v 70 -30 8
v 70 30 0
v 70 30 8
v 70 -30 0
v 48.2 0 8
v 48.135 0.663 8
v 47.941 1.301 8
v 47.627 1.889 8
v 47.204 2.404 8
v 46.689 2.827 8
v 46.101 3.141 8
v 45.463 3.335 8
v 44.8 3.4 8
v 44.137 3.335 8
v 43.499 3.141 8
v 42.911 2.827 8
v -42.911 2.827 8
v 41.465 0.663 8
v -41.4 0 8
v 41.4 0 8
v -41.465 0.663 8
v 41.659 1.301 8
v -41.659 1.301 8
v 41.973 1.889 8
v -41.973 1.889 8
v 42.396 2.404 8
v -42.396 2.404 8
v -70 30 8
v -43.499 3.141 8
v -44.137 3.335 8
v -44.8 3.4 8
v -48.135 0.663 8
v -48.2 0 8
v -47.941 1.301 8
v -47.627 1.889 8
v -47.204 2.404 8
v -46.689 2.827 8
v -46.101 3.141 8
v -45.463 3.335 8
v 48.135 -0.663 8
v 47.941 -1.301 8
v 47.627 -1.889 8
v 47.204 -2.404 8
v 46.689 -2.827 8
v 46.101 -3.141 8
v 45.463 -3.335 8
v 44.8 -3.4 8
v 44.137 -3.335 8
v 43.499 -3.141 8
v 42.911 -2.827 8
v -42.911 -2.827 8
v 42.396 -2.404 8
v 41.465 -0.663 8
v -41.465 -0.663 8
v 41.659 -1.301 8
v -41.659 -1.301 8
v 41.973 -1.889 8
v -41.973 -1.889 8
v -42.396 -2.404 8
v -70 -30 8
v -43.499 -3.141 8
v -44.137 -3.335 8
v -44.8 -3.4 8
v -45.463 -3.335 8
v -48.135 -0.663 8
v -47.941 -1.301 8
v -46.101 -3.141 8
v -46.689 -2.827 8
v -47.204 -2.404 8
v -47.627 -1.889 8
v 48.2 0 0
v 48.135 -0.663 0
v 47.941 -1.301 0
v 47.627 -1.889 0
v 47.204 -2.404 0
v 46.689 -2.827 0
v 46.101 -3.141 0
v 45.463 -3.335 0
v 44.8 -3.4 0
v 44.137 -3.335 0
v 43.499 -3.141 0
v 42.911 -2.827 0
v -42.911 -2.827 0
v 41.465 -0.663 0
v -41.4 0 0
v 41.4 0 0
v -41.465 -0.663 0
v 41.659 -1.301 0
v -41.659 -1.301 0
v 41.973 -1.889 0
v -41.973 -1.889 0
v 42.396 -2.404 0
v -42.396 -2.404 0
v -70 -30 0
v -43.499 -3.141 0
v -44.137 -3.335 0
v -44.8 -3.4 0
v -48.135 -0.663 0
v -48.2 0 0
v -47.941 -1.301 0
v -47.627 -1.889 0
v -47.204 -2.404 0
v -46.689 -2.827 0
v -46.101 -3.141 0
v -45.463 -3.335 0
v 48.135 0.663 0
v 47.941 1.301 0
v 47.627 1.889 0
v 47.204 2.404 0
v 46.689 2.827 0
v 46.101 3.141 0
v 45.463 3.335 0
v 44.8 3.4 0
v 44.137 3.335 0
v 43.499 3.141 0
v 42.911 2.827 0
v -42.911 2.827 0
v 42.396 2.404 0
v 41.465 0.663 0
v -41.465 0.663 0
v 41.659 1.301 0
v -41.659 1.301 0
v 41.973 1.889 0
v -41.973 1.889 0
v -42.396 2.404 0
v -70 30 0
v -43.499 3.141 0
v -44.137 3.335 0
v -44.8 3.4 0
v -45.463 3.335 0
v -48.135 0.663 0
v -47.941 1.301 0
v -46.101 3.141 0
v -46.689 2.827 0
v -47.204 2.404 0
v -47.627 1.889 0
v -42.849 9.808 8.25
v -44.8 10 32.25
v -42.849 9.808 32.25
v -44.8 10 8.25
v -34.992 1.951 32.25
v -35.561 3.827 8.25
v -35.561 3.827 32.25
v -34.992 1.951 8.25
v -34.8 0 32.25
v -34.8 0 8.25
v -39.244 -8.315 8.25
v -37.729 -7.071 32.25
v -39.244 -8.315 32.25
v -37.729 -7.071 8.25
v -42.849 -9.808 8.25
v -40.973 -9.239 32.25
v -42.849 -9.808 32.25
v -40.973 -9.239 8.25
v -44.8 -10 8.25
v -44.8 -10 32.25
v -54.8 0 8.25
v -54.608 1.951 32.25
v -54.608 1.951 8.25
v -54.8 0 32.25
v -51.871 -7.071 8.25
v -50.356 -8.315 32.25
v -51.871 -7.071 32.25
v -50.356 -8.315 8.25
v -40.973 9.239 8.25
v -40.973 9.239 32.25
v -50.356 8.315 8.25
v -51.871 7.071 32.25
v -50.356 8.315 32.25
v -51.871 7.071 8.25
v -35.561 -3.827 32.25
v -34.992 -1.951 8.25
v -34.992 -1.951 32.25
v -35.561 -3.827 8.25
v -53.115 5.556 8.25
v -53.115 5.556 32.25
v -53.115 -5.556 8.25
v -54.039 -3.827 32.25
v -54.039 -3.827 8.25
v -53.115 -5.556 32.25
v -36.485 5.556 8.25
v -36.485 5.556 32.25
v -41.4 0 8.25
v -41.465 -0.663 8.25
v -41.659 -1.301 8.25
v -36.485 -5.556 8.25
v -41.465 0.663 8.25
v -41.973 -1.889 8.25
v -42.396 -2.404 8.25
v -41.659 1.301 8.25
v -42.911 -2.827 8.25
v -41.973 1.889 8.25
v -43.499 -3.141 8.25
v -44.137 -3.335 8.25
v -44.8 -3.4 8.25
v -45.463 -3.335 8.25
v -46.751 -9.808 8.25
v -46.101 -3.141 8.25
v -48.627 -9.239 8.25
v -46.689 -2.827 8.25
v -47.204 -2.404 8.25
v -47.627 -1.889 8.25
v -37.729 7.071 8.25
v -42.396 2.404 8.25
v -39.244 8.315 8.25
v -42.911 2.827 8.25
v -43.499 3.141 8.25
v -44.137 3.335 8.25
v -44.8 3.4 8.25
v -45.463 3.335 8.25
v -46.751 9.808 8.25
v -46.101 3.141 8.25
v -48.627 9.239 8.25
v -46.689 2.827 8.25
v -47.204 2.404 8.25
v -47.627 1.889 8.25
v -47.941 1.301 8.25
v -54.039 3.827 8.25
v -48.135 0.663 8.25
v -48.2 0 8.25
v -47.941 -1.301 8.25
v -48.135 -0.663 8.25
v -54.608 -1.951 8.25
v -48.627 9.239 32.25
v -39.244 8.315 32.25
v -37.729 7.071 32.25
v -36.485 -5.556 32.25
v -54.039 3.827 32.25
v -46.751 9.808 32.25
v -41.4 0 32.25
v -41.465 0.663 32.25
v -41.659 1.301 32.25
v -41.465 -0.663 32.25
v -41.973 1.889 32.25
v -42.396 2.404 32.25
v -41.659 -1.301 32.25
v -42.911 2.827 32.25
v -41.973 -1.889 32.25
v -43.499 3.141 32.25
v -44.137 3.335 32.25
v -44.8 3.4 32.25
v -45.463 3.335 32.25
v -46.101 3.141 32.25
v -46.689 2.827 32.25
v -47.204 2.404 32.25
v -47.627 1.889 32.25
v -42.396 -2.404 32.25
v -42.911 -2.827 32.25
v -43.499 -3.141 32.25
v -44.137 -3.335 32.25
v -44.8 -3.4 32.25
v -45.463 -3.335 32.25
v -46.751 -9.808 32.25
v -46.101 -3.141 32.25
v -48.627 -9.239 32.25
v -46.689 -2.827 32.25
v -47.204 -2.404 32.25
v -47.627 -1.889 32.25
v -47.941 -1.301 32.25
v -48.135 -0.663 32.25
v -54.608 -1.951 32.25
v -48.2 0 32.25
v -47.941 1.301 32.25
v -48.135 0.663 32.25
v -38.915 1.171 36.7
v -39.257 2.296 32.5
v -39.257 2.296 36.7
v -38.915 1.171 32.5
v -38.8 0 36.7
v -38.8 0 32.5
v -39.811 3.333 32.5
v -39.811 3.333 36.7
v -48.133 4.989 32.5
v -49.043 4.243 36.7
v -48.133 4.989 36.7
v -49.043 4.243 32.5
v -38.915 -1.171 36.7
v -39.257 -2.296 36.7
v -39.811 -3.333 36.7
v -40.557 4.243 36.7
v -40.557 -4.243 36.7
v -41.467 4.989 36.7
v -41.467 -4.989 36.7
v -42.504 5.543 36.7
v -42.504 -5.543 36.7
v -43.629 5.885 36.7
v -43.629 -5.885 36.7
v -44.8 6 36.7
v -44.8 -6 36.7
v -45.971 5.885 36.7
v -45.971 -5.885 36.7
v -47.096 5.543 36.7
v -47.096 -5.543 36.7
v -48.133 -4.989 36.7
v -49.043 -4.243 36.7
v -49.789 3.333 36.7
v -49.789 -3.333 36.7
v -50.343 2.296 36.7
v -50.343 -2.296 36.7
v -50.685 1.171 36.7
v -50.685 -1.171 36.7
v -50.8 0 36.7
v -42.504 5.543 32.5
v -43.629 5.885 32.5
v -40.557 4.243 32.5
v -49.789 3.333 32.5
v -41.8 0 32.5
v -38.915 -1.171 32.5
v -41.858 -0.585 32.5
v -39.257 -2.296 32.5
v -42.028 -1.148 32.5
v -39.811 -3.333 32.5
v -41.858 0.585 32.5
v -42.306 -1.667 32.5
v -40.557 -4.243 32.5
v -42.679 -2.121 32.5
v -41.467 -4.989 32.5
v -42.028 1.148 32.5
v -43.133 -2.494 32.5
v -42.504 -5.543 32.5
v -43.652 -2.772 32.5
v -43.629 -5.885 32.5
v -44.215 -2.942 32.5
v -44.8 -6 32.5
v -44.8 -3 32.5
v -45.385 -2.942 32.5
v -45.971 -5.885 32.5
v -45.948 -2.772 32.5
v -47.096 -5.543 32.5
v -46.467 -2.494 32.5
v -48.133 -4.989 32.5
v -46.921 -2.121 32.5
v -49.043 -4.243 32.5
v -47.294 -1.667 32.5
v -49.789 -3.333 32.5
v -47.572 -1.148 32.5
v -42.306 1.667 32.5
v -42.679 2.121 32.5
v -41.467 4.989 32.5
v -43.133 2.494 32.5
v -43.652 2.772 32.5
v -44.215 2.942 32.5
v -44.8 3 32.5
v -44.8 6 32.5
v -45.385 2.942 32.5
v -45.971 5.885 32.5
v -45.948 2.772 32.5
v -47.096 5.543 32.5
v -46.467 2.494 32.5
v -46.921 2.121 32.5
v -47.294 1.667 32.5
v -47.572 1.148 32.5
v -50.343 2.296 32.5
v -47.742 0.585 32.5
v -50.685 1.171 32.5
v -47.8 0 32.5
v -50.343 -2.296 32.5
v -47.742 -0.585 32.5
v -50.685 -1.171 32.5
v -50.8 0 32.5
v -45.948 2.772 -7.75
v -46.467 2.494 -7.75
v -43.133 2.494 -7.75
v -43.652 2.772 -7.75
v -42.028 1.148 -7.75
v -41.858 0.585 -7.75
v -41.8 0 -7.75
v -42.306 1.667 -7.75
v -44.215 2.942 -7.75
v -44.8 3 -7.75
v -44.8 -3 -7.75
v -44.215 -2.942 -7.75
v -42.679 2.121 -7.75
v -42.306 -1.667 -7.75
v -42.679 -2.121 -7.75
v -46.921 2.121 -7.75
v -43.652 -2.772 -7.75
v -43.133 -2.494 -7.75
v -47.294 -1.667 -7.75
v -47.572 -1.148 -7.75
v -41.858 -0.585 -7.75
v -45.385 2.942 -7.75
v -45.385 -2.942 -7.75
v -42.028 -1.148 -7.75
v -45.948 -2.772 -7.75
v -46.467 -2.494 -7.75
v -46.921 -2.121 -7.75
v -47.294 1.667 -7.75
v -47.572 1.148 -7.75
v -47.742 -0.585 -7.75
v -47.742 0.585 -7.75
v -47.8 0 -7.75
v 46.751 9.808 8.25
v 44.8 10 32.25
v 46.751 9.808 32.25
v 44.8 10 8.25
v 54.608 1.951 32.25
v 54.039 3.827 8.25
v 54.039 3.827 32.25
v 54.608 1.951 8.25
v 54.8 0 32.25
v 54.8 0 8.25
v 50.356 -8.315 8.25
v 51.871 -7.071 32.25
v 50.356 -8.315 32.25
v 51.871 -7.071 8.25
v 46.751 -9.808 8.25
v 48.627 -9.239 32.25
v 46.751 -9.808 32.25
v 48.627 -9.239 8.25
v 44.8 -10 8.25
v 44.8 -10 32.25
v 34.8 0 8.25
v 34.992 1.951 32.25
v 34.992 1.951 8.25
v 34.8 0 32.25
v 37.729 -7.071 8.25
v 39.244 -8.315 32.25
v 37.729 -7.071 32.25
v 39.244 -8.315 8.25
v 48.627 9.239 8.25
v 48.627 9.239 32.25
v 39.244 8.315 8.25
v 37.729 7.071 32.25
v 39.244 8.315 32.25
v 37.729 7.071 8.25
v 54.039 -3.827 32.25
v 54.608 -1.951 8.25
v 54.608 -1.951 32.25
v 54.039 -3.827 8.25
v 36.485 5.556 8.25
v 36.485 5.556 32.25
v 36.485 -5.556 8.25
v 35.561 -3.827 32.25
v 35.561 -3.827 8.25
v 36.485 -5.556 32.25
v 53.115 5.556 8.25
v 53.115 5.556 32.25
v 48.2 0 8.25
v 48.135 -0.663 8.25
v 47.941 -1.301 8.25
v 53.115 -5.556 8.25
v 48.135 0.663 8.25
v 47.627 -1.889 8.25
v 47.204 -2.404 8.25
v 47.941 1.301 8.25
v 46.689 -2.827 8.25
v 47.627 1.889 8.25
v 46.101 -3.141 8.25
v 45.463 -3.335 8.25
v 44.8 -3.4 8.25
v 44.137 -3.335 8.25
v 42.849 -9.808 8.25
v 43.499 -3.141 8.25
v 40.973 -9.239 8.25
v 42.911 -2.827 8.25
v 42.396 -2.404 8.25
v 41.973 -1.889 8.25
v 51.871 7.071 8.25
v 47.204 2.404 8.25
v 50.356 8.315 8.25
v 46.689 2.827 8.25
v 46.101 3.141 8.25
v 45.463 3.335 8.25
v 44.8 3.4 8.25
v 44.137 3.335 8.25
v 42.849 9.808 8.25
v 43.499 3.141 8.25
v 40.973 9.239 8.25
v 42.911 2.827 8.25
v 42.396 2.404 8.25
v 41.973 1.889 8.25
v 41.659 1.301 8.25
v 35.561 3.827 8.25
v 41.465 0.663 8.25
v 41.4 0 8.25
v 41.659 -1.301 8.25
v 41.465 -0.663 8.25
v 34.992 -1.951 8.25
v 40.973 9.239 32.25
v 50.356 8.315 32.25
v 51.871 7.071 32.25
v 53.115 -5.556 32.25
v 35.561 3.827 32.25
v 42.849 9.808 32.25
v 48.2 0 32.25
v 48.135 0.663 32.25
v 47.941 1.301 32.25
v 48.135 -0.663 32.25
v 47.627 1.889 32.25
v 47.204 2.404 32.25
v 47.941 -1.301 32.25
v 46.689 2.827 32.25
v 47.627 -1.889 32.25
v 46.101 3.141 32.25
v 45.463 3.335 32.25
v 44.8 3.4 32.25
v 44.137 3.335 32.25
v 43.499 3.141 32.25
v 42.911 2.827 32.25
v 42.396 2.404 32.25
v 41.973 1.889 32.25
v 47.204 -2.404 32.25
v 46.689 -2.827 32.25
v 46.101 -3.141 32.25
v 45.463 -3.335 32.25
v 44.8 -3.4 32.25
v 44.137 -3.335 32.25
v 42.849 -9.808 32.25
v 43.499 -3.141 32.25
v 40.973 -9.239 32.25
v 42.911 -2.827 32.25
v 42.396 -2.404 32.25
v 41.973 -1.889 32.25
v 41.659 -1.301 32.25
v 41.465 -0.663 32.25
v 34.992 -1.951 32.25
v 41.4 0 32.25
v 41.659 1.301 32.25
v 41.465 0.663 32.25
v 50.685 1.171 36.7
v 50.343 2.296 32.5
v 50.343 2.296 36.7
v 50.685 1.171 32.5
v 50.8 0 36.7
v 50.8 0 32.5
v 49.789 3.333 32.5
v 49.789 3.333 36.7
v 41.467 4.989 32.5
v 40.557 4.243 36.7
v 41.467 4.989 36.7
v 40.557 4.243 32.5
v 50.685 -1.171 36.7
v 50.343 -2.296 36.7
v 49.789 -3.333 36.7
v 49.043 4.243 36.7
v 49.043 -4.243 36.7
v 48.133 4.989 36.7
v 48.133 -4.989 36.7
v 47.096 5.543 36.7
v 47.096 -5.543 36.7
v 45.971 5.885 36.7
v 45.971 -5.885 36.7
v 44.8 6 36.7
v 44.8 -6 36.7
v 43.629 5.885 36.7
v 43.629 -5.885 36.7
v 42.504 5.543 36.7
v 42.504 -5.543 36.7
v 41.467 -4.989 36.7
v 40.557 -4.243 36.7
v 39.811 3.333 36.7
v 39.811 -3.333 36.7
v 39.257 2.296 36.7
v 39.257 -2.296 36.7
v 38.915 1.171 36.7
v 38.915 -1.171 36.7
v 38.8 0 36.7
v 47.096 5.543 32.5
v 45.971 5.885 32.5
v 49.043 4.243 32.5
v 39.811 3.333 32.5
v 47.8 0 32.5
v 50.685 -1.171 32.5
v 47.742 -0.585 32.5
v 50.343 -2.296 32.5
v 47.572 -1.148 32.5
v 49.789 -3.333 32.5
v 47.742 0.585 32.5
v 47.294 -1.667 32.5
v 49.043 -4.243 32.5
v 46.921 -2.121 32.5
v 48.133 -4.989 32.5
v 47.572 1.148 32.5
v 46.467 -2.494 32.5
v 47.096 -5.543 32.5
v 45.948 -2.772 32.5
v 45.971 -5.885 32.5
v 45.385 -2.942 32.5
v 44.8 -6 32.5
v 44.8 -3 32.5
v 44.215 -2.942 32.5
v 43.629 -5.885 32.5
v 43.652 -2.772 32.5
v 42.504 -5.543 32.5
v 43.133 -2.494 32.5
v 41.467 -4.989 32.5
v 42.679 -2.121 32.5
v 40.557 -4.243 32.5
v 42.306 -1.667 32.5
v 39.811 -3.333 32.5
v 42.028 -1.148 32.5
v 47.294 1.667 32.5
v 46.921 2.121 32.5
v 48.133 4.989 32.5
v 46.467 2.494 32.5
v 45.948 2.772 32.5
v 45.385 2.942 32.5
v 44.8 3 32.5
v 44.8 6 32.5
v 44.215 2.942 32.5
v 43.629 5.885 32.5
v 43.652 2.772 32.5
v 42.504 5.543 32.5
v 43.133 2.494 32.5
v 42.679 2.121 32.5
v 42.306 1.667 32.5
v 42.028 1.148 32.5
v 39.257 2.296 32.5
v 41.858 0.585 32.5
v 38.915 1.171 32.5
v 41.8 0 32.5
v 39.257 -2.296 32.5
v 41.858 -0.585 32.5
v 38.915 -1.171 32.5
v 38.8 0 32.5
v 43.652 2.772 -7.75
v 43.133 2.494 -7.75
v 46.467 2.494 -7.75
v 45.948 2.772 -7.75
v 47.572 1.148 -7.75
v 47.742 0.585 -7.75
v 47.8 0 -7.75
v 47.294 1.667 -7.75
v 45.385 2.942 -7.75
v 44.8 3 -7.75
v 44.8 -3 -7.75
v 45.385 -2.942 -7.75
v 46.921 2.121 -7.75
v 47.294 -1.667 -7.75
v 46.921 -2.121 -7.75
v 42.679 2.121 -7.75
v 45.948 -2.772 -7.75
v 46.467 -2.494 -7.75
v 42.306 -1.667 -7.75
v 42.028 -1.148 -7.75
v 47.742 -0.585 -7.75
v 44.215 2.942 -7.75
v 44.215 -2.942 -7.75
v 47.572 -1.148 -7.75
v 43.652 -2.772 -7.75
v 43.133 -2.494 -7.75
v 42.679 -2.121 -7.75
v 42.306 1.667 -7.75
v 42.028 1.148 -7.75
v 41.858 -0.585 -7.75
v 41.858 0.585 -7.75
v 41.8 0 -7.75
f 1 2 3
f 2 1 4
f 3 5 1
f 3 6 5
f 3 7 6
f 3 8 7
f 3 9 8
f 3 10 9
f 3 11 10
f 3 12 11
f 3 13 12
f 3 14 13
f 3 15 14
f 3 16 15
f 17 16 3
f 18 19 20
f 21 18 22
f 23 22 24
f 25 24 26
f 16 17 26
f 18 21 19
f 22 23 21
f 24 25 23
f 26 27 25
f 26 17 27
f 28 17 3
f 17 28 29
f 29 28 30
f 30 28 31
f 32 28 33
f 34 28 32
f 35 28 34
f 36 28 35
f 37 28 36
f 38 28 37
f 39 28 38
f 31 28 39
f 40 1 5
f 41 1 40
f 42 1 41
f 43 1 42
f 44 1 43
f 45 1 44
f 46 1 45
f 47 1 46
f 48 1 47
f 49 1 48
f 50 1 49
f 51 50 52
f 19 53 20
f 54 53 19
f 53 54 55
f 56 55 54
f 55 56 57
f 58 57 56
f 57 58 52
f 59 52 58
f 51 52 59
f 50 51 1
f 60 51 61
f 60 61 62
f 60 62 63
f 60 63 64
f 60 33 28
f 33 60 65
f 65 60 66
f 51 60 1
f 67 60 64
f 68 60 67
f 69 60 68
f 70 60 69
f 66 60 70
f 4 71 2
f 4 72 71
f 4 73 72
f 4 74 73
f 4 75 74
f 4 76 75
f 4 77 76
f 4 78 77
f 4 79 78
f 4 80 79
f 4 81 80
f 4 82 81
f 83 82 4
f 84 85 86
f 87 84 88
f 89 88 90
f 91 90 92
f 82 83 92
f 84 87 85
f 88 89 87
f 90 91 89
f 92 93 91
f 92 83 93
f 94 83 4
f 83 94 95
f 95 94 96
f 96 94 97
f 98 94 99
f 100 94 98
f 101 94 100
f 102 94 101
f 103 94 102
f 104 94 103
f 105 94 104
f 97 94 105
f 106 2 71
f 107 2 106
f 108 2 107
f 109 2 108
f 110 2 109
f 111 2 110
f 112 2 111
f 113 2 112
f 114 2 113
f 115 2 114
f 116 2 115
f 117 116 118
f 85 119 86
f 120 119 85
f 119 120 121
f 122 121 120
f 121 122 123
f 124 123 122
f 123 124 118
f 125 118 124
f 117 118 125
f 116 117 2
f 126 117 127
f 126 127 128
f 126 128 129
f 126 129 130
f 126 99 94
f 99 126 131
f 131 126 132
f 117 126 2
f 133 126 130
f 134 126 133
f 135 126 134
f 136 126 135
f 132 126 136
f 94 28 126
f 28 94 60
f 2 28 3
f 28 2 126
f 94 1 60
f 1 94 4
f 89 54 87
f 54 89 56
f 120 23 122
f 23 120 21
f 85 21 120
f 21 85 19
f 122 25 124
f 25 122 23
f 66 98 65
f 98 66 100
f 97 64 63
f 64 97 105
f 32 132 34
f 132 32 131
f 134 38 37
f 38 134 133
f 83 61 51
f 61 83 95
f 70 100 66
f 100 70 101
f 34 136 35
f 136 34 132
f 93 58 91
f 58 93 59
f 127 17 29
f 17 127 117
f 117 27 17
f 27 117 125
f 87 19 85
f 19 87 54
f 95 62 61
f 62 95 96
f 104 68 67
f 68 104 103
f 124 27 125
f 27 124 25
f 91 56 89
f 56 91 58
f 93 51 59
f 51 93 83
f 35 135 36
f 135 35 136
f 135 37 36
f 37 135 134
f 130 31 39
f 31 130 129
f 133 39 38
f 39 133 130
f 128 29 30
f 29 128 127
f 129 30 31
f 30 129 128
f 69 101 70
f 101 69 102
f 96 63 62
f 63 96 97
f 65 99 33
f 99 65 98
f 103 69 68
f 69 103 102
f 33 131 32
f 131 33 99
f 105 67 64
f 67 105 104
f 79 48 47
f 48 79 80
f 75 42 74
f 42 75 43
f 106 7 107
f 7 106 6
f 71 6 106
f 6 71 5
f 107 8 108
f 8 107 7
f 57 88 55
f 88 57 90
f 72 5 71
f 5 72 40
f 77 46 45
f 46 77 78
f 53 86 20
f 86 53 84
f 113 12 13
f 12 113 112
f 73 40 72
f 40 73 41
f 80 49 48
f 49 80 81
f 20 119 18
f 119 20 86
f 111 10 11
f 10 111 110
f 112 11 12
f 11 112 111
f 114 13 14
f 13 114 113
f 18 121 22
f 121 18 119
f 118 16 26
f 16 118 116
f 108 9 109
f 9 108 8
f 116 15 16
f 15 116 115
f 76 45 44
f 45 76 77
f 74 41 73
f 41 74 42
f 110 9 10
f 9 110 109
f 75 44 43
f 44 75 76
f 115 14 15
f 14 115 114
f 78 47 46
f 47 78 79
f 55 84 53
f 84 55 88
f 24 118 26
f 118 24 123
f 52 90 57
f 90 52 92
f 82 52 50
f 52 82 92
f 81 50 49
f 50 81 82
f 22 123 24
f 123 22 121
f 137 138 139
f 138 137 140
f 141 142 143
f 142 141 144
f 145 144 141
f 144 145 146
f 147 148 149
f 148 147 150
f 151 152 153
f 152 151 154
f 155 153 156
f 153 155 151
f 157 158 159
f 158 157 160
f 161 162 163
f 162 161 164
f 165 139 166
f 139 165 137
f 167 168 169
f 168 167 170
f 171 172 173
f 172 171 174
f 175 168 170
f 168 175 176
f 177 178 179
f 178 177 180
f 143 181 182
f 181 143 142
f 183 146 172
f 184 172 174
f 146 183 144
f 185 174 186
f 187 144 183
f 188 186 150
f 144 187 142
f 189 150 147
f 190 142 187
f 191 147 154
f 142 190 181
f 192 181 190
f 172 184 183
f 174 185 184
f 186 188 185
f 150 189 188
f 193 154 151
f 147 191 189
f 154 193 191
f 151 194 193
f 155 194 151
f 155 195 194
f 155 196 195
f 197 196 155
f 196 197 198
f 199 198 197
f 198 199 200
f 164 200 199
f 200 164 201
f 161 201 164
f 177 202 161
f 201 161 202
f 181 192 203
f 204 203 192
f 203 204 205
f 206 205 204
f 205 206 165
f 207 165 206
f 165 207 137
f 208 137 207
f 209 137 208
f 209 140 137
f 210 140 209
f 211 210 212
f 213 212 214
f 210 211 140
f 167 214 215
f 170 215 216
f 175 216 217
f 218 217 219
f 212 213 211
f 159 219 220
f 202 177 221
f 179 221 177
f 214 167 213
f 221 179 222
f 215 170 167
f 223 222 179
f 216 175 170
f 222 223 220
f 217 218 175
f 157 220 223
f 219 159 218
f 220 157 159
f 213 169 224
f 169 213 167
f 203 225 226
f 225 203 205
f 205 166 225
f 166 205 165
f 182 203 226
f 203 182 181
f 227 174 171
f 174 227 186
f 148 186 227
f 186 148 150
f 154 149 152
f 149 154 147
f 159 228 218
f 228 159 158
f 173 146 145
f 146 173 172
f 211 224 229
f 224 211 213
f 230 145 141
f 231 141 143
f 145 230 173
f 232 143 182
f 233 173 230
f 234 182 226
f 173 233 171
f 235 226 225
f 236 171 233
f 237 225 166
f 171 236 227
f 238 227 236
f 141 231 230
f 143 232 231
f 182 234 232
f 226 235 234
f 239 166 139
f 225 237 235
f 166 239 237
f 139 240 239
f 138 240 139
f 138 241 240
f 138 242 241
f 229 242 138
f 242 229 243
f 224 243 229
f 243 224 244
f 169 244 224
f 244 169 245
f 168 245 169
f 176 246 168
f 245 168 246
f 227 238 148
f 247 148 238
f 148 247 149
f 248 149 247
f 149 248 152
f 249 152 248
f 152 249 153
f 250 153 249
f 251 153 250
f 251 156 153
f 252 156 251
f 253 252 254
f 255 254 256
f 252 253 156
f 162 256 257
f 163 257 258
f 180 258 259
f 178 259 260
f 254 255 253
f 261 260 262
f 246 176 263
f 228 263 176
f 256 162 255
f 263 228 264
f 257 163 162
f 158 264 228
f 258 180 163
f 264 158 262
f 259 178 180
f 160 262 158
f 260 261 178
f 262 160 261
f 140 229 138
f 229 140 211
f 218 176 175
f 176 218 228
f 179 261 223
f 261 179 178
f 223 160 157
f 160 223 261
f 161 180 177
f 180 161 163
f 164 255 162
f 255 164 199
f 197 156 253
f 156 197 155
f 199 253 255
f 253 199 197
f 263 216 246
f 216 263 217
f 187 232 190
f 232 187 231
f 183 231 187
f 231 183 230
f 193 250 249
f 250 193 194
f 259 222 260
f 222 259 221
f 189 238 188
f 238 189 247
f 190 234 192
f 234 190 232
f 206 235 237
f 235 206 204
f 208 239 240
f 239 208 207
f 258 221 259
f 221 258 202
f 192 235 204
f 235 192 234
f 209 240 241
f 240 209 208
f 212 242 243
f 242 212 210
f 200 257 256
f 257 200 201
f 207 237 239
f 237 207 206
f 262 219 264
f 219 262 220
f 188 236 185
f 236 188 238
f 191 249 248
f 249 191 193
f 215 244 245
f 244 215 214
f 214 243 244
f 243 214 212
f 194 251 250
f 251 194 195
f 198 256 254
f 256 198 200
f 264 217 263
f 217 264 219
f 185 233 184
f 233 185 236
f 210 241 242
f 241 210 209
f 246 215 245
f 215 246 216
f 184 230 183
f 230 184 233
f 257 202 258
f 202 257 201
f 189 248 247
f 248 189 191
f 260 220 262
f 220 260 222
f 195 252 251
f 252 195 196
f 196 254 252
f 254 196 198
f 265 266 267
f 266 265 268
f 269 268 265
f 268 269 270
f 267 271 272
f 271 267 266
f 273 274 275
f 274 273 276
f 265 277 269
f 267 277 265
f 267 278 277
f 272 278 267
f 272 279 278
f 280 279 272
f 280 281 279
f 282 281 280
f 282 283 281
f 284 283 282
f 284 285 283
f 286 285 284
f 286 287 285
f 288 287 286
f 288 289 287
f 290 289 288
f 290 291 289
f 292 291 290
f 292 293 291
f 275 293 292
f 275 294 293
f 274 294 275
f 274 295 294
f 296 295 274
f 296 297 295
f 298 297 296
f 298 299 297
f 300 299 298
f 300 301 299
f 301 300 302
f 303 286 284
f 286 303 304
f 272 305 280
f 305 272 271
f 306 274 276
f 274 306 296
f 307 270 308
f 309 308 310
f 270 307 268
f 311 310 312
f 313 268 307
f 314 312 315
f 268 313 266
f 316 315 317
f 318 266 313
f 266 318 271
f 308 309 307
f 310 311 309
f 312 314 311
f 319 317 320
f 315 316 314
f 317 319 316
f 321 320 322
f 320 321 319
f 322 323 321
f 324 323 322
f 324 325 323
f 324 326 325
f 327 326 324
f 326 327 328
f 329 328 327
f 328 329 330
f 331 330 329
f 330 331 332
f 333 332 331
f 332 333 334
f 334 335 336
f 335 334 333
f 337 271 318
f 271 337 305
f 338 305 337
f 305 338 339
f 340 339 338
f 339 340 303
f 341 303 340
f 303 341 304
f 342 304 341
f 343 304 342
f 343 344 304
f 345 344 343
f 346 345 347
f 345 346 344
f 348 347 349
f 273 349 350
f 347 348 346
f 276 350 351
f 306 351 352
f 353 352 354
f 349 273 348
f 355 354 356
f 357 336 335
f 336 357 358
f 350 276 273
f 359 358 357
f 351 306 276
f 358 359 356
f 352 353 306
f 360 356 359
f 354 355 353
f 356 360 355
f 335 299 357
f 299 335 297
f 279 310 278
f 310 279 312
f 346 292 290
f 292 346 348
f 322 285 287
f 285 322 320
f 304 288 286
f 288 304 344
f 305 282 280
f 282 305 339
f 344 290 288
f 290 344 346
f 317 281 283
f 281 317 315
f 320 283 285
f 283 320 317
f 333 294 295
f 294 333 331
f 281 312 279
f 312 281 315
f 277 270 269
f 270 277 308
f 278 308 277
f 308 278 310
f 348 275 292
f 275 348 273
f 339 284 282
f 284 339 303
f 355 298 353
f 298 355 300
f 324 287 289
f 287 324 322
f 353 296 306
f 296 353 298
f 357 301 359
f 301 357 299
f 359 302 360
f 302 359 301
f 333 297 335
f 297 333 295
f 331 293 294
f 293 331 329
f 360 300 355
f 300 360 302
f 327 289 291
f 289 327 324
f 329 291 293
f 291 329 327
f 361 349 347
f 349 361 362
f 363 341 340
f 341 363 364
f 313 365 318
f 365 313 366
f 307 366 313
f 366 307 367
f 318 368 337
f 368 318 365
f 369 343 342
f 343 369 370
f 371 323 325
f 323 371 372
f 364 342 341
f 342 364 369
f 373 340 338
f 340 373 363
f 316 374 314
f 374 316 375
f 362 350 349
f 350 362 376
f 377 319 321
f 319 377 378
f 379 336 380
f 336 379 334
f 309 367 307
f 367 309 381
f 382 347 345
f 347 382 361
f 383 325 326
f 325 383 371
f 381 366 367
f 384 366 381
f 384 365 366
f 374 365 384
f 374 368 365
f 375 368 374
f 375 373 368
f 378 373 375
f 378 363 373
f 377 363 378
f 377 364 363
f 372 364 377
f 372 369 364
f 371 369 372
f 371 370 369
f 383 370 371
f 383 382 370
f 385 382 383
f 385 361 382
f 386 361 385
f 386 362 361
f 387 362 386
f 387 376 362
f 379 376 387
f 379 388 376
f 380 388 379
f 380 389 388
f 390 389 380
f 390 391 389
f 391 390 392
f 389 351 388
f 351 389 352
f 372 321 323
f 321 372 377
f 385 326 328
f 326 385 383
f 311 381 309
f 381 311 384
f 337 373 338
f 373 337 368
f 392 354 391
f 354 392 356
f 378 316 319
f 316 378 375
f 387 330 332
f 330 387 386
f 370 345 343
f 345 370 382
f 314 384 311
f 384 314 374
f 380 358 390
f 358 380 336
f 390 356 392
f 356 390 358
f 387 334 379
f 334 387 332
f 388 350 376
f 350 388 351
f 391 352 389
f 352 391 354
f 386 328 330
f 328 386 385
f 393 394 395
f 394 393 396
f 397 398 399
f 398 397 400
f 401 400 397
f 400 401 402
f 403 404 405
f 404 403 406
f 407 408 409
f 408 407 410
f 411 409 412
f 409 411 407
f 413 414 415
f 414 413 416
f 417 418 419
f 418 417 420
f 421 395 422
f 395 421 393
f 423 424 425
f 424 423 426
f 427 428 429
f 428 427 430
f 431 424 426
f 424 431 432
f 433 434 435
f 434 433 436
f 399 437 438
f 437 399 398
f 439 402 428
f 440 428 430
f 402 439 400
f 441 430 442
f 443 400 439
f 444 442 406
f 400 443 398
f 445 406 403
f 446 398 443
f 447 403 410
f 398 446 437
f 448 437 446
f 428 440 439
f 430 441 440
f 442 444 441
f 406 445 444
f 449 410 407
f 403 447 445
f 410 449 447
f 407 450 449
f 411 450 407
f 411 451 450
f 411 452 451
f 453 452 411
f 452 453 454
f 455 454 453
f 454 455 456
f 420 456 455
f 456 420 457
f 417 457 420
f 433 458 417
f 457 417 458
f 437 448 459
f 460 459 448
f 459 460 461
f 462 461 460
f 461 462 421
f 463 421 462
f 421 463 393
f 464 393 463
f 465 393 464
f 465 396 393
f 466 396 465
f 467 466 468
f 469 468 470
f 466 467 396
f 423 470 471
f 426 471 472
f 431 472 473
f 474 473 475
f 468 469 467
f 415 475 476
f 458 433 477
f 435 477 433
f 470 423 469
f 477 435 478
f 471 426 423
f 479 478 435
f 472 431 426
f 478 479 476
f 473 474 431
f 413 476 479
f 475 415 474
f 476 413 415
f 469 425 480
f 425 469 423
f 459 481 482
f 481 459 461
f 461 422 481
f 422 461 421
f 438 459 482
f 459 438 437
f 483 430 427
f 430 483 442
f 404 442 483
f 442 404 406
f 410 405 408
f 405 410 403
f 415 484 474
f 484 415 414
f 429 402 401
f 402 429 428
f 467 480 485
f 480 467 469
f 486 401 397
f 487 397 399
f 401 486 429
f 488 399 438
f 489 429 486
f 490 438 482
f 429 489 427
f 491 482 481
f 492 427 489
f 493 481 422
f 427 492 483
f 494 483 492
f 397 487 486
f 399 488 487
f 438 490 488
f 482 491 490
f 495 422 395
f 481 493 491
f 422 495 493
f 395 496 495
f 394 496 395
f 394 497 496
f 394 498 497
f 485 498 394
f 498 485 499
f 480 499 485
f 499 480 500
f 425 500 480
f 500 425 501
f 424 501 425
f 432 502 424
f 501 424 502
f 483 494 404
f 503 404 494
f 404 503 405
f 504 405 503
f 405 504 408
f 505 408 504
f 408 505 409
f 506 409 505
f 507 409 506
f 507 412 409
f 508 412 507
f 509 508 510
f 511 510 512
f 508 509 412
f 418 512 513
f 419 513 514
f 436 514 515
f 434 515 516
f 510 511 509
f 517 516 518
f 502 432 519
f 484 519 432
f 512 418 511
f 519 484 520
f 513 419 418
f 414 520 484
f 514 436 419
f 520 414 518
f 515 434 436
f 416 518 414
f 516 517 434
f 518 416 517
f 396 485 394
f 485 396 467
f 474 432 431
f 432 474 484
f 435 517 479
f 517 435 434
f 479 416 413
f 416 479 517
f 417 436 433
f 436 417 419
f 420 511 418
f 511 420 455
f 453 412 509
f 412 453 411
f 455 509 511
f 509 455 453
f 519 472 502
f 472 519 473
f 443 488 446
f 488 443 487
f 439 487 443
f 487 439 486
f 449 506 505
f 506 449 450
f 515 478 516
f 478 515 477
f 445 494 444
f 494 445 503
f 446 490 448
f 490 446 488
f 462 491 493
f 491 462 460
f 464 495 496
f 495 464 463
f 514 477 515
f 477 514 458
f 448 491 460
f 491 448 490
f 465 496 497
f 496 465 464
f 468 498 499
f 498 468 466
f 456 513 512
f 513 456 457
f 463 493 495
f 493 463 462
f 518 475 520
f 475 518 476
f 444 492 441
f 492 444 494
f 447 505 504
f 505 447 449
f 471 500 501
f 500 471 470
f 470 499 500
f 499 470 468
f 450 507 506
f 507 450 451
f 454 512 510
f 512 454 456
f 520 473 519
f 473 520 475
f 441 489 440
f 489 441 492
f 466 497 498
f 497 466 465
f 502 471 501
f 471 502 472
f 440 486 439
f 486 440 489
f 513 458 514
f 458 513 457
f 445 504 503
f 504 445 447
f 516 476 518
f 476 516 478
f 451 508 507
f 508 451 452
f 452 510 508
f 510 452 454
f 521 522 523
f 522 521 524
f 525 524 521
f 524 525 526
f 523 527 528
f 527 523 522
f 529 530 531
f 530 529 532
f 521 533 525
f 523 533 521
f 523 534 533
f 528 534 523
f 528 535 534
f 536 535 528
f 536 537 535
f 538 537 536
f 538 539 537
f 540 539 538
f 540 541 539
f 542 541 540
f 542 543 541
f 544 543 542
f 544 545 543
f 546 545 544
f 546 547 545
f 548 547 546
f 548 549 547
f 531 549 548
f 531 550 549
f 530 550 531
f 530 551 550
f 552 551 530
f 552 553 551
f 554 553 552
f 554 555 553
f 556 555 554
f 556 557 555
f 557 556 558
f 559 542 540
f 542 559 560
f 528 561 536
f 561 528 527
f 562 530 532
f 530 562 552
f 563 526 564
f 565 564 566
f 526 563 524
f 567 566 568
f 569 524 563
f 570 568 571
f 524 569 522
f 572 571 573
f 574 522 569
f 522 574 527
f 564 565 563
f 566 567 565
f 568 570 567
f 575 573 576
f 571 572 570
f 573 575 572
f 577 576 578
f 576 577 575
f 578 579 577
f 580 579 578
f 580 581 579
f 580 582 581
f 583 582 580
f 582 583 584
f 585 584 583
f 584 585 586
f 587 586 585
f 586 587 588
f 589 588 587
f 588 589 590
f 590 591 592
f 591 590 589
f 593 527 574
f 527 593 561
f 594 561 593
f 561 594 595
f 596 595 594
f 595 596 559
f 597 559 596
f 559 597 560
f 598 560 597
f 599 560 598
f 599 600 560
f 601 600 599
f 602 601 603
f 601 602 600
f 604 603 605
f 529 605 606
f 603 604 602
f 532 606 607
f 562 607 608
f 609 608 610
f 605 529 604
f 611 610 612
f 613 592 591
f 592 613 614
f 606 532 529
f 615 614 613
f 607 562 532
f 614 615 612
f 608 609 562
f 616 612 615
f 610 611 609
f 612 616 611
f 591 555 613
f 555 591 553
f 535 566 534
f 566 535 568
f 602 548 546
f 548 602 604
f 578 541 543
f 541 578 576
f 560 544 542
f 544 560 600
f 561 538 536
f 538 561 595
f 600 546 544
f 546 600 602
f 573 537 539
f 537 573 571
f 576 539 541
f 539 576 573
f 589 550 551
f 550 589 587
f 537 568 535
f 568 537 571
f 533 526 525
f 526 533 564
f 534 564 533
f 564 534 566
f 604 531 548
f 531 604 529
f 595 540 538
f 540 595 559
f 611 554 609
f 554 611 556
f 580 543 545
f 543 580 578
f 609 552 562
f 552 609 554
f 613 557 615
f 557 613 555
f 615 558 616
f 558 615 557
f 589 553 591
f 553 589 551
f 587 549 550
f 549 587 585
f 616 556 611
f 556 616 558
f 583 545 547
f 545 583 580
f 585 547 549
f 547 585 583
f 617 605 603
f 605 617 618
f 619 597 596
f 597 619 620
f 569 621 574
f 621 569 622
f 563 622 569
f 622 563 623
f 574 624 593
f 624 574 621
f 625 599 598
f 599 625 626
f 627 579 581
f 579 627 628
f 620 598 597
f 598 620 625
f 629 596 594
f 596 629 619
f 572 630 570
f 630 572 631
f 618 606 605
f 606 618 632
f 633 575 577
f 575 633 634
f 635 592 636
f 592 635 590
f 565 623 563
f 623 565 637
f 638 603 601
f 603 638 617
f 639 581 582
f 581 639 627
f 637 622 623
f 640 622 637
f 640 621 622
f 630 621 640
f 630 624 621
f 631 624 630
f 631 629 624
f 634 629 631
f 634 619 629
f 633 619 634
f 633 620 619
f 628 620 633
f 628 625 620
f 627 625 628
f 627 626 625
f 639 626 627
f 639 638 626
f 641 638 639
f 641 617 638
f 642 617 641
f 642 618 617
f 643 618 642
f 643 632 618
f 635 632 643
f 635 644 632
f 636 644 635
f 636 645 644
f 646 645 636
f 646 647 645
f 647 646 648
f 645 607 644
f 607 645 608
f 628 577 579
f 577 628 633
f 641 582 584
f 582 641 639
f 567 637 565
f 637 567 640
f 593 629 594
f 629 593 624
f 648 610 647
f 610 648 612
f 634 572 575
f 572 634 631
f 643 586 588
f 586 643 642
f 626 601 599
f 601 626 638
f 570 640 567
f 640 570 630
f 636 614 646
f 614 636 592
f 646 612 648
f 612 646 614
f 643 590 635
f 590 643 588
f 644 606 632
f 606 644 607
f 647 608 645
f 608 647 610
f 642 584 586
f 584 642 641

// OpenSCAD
$fn = 32;

// ------------------------------------------------------------------------
// Standoff columns: 2 d20 standoffs, bolts d6
// Every part is its own module, assembly() places them once.
// ------------------------------------------------------------------------

// --- part 1 ---
module base_plate() {
  difference() {
    translate([-70, -30, 0]) cube([140, 60, 8]);
    translate([-44.8, 0, -1]) cylinder(h = 10, d = 6.8);
    translate([44.8, 0, -1]) cylinder(h = 10, d = 6.8);
  }
}

// --- part 2 ---
module spacer1() {
  difference() {
      translate([0, 0, 0]) cylinder(h = 24, d = 20);
      translate([0, 0, -1]) cylinder(h = 26, d = 6.8);
    }
}

// --- part 3 ---
module bolt1() {
  cylinder(h = 4.2, d = 12);
  translate([0, 0, -40.25]) cylinder(h = 40.25, d = 6);
}

// --- part 4 ---
module spacer2() {
  difference() {
      translate([0, 0, 0]) cylinder(h = 24, d = 20);
      translate([0, 0, -1]) cylinder(h = 26, d = 6.8);
    }
}

// --- part 5 ---
module bolt2() {
  cylinder(h = 4.2, d = 12);
  translate([0, 0, -40.25]) cylinder(h = 40.25, d = 6);
}

// --- assembly ---
module assembly() {
  translate([0, 0, 0]) rotate([0, 0, 0]) base_plate();
  translate([-44.8, 0, 8.25]) rotate([0, 0, 0]) spacer1();
  translate([-44.8, 0, 32.5]) rotate([0, 0, 0]) bolt1();
  translate([44.8, 0, 8.25]) rotate([0, 0, 0]) spacer2();
  translate([44.8, 0, 32.5]) rotate([0, 0, 0]) bolt2();
}

assembly();
